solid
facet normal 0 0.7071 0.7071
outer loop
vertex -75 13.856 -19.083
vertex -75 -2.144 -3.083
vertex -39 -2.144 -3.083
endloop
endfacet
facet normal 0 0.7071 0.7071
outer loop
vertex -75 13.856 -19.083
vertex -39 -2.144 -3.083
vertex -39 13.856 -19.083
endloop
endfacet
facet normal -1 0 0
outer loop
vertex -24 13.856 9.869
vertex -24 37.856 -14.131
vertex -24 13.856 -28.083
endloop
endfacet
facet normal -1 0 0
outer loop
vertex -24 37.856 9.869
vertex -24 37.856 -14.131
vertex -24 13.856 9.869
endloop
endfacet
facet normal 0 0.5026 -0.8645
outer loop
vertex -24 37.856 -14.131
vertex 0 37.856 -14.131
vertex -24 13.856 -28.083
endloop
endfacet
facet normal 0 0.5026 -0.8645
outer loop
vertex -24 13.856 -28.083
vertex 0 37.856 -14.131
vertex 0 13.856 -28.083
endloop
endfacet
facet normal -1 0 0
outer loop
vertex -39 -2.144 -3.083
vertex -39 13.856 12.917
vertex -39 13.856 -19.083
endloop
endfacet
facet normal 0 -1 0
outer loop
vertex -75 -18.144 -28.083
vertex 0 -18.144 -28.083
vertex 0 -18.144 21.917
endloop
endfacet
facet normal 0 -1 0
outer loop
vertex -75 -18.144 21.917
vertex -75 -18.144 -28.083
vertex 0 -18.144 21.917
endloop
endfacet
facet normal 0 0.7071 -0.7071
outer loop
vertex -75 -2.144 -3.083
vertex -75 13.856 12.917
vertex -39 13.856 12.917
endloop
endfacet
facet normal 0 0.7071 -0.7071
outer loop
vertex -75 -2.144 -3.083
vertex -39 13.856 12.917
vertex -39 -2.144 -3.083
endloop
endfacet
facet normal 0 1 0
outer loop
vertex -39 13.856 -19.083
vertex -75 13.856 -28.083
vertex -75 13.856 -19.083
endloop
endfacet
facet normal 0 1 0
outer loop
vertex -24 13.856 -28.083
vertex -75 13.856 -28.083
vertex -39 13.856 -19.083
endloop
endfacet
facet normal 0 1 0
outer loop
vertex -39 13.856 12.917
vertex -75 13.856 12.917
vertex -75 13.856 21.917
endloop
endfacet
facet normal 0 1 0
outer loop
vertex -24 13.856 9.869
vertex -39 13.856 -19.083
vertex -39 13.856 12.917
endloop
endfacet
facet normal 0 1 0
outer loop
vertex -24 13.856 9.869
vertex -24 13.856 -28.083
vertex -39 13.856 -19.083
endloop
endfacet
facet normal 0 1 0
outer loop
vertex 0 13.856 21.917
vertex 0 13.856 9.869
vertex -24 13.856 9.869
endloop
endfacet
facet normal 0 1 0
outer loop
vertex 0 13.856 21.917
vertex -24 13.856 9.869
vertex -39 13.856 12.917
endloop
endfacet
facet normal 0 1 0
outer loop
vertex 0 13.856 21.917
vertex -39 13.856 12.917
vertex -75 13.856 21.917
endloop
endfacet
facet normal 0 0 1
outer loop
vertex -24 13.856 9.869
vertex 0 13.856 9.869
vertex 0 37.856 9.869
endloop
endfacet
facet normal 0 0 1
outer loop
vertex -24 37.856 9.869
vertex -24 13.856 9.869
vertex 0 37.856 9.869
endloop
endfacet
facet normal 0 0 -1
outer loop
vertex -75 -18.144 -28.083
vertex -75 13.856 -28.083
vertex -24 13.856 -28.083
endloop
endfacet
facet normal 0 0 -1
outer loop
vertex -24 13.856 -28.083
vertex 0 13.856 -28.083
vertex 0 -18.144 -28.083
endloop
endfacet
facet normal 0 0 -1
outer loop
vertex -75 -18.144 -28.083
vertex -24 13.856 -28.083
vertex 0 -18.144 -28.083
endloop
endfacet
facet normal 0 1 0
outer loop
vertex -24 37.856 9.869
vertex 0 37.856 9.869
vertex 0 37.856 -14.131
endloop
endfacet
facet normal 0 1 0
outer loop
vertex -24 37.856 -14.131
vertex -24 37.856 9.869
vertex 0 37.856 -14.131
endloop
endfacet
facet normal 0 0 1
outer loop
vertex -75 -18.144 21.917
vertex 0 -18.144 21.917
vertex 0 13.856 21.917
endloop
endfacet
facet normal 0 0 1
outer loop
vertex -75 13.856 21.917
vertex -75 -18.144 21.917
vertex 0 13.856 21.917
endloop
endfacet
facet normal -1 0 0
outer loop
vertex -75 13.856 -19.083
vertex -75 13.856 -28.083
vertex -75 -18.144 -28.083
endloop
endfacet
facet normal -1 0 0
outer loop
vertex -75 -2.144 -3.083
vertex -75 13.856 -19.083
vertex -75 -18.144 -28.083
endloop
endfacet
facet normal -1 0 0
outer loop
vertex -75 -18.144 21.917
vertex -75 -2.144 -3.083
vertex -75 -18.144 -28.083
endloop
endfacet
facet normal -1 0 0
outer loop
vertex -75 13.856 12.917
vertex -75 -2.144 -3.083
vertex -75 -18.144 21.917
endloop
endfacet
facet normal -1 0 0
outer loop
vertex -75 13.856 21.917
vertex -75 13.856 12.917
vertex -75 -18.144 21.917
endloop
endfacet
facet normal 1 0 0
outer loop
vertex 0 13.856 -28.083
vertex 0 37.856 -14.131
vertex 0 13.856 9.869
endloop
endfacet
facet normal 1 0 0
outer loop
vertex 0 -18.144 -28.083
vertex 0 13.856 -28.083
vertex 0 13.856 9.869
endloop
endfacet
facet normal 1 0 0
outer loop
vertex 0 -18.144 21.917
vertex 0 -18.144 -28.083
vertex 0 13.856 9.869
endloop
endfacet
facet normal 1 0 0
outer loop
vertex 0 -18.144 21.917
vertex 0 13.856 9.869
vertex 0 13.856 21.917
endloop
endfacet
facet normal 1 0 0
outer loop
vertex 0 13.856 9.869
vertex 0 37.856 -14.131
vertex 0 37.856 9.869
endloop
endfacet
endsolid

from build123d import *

# Parameters (mm, degrees)
BOSS_EXTRUDE1_DEPTH = 75
CUT_EXTRUDE1_DEPTH  = 51
CUT_EXTRUDE2_DEPTH  = 36


with BuildPart() as part:
    # Sketch1 → Boss-Extrude1 (new body)
    with BuildSketch(Plane(origin=(0, 0, 0), x_dir=(0, 0, -1), z_dir=(1, 0, 0))):
        Polygon((-21.916783927, 13.855955679), (-9.869343833, 13.855955679), (28.083216073, 13.855955679), (28.083216073, -18.144044321), (-21.916783927, -18.144044321), align=None)
        Polygon((14.130656167, 37.855955679), (28.083216073, 13.855955679), (-9.869343833, 13.855955679), (-9.869343833, 37.855955679), align=None)
    extrude(amount=-BOSS_EXTRUDE1_DEPTH)

    # Sketch2 → Cut-Extrude1 (cut)
    with BuildSketch(Plane.ZY.offset(75)):
        Polygon((-28.083216073, 13.855955679), (9.869343833, 13.855955679), (9.869343833, 37.855955679), (-14.130656167, 37.855955679), align=None)
    extrude(amount=-CUT_EXTRUDE1_DEPTH, mode=Mode.SUBTRACT)

    # Sketch3 → Cut-Extrude2 (cut)
    with BuildSketch(Plane.ZY.offset(75)):
        Polygon((-19.083216073, 13.855955679), (12.916783927, 13.855955679), (-3.083216073, -2.144044321), align=None)
    extrude(amount=-CUT_EXTRUDE2_DEPTH, mode=Mode.SUBTRACT)


solid = part.part
